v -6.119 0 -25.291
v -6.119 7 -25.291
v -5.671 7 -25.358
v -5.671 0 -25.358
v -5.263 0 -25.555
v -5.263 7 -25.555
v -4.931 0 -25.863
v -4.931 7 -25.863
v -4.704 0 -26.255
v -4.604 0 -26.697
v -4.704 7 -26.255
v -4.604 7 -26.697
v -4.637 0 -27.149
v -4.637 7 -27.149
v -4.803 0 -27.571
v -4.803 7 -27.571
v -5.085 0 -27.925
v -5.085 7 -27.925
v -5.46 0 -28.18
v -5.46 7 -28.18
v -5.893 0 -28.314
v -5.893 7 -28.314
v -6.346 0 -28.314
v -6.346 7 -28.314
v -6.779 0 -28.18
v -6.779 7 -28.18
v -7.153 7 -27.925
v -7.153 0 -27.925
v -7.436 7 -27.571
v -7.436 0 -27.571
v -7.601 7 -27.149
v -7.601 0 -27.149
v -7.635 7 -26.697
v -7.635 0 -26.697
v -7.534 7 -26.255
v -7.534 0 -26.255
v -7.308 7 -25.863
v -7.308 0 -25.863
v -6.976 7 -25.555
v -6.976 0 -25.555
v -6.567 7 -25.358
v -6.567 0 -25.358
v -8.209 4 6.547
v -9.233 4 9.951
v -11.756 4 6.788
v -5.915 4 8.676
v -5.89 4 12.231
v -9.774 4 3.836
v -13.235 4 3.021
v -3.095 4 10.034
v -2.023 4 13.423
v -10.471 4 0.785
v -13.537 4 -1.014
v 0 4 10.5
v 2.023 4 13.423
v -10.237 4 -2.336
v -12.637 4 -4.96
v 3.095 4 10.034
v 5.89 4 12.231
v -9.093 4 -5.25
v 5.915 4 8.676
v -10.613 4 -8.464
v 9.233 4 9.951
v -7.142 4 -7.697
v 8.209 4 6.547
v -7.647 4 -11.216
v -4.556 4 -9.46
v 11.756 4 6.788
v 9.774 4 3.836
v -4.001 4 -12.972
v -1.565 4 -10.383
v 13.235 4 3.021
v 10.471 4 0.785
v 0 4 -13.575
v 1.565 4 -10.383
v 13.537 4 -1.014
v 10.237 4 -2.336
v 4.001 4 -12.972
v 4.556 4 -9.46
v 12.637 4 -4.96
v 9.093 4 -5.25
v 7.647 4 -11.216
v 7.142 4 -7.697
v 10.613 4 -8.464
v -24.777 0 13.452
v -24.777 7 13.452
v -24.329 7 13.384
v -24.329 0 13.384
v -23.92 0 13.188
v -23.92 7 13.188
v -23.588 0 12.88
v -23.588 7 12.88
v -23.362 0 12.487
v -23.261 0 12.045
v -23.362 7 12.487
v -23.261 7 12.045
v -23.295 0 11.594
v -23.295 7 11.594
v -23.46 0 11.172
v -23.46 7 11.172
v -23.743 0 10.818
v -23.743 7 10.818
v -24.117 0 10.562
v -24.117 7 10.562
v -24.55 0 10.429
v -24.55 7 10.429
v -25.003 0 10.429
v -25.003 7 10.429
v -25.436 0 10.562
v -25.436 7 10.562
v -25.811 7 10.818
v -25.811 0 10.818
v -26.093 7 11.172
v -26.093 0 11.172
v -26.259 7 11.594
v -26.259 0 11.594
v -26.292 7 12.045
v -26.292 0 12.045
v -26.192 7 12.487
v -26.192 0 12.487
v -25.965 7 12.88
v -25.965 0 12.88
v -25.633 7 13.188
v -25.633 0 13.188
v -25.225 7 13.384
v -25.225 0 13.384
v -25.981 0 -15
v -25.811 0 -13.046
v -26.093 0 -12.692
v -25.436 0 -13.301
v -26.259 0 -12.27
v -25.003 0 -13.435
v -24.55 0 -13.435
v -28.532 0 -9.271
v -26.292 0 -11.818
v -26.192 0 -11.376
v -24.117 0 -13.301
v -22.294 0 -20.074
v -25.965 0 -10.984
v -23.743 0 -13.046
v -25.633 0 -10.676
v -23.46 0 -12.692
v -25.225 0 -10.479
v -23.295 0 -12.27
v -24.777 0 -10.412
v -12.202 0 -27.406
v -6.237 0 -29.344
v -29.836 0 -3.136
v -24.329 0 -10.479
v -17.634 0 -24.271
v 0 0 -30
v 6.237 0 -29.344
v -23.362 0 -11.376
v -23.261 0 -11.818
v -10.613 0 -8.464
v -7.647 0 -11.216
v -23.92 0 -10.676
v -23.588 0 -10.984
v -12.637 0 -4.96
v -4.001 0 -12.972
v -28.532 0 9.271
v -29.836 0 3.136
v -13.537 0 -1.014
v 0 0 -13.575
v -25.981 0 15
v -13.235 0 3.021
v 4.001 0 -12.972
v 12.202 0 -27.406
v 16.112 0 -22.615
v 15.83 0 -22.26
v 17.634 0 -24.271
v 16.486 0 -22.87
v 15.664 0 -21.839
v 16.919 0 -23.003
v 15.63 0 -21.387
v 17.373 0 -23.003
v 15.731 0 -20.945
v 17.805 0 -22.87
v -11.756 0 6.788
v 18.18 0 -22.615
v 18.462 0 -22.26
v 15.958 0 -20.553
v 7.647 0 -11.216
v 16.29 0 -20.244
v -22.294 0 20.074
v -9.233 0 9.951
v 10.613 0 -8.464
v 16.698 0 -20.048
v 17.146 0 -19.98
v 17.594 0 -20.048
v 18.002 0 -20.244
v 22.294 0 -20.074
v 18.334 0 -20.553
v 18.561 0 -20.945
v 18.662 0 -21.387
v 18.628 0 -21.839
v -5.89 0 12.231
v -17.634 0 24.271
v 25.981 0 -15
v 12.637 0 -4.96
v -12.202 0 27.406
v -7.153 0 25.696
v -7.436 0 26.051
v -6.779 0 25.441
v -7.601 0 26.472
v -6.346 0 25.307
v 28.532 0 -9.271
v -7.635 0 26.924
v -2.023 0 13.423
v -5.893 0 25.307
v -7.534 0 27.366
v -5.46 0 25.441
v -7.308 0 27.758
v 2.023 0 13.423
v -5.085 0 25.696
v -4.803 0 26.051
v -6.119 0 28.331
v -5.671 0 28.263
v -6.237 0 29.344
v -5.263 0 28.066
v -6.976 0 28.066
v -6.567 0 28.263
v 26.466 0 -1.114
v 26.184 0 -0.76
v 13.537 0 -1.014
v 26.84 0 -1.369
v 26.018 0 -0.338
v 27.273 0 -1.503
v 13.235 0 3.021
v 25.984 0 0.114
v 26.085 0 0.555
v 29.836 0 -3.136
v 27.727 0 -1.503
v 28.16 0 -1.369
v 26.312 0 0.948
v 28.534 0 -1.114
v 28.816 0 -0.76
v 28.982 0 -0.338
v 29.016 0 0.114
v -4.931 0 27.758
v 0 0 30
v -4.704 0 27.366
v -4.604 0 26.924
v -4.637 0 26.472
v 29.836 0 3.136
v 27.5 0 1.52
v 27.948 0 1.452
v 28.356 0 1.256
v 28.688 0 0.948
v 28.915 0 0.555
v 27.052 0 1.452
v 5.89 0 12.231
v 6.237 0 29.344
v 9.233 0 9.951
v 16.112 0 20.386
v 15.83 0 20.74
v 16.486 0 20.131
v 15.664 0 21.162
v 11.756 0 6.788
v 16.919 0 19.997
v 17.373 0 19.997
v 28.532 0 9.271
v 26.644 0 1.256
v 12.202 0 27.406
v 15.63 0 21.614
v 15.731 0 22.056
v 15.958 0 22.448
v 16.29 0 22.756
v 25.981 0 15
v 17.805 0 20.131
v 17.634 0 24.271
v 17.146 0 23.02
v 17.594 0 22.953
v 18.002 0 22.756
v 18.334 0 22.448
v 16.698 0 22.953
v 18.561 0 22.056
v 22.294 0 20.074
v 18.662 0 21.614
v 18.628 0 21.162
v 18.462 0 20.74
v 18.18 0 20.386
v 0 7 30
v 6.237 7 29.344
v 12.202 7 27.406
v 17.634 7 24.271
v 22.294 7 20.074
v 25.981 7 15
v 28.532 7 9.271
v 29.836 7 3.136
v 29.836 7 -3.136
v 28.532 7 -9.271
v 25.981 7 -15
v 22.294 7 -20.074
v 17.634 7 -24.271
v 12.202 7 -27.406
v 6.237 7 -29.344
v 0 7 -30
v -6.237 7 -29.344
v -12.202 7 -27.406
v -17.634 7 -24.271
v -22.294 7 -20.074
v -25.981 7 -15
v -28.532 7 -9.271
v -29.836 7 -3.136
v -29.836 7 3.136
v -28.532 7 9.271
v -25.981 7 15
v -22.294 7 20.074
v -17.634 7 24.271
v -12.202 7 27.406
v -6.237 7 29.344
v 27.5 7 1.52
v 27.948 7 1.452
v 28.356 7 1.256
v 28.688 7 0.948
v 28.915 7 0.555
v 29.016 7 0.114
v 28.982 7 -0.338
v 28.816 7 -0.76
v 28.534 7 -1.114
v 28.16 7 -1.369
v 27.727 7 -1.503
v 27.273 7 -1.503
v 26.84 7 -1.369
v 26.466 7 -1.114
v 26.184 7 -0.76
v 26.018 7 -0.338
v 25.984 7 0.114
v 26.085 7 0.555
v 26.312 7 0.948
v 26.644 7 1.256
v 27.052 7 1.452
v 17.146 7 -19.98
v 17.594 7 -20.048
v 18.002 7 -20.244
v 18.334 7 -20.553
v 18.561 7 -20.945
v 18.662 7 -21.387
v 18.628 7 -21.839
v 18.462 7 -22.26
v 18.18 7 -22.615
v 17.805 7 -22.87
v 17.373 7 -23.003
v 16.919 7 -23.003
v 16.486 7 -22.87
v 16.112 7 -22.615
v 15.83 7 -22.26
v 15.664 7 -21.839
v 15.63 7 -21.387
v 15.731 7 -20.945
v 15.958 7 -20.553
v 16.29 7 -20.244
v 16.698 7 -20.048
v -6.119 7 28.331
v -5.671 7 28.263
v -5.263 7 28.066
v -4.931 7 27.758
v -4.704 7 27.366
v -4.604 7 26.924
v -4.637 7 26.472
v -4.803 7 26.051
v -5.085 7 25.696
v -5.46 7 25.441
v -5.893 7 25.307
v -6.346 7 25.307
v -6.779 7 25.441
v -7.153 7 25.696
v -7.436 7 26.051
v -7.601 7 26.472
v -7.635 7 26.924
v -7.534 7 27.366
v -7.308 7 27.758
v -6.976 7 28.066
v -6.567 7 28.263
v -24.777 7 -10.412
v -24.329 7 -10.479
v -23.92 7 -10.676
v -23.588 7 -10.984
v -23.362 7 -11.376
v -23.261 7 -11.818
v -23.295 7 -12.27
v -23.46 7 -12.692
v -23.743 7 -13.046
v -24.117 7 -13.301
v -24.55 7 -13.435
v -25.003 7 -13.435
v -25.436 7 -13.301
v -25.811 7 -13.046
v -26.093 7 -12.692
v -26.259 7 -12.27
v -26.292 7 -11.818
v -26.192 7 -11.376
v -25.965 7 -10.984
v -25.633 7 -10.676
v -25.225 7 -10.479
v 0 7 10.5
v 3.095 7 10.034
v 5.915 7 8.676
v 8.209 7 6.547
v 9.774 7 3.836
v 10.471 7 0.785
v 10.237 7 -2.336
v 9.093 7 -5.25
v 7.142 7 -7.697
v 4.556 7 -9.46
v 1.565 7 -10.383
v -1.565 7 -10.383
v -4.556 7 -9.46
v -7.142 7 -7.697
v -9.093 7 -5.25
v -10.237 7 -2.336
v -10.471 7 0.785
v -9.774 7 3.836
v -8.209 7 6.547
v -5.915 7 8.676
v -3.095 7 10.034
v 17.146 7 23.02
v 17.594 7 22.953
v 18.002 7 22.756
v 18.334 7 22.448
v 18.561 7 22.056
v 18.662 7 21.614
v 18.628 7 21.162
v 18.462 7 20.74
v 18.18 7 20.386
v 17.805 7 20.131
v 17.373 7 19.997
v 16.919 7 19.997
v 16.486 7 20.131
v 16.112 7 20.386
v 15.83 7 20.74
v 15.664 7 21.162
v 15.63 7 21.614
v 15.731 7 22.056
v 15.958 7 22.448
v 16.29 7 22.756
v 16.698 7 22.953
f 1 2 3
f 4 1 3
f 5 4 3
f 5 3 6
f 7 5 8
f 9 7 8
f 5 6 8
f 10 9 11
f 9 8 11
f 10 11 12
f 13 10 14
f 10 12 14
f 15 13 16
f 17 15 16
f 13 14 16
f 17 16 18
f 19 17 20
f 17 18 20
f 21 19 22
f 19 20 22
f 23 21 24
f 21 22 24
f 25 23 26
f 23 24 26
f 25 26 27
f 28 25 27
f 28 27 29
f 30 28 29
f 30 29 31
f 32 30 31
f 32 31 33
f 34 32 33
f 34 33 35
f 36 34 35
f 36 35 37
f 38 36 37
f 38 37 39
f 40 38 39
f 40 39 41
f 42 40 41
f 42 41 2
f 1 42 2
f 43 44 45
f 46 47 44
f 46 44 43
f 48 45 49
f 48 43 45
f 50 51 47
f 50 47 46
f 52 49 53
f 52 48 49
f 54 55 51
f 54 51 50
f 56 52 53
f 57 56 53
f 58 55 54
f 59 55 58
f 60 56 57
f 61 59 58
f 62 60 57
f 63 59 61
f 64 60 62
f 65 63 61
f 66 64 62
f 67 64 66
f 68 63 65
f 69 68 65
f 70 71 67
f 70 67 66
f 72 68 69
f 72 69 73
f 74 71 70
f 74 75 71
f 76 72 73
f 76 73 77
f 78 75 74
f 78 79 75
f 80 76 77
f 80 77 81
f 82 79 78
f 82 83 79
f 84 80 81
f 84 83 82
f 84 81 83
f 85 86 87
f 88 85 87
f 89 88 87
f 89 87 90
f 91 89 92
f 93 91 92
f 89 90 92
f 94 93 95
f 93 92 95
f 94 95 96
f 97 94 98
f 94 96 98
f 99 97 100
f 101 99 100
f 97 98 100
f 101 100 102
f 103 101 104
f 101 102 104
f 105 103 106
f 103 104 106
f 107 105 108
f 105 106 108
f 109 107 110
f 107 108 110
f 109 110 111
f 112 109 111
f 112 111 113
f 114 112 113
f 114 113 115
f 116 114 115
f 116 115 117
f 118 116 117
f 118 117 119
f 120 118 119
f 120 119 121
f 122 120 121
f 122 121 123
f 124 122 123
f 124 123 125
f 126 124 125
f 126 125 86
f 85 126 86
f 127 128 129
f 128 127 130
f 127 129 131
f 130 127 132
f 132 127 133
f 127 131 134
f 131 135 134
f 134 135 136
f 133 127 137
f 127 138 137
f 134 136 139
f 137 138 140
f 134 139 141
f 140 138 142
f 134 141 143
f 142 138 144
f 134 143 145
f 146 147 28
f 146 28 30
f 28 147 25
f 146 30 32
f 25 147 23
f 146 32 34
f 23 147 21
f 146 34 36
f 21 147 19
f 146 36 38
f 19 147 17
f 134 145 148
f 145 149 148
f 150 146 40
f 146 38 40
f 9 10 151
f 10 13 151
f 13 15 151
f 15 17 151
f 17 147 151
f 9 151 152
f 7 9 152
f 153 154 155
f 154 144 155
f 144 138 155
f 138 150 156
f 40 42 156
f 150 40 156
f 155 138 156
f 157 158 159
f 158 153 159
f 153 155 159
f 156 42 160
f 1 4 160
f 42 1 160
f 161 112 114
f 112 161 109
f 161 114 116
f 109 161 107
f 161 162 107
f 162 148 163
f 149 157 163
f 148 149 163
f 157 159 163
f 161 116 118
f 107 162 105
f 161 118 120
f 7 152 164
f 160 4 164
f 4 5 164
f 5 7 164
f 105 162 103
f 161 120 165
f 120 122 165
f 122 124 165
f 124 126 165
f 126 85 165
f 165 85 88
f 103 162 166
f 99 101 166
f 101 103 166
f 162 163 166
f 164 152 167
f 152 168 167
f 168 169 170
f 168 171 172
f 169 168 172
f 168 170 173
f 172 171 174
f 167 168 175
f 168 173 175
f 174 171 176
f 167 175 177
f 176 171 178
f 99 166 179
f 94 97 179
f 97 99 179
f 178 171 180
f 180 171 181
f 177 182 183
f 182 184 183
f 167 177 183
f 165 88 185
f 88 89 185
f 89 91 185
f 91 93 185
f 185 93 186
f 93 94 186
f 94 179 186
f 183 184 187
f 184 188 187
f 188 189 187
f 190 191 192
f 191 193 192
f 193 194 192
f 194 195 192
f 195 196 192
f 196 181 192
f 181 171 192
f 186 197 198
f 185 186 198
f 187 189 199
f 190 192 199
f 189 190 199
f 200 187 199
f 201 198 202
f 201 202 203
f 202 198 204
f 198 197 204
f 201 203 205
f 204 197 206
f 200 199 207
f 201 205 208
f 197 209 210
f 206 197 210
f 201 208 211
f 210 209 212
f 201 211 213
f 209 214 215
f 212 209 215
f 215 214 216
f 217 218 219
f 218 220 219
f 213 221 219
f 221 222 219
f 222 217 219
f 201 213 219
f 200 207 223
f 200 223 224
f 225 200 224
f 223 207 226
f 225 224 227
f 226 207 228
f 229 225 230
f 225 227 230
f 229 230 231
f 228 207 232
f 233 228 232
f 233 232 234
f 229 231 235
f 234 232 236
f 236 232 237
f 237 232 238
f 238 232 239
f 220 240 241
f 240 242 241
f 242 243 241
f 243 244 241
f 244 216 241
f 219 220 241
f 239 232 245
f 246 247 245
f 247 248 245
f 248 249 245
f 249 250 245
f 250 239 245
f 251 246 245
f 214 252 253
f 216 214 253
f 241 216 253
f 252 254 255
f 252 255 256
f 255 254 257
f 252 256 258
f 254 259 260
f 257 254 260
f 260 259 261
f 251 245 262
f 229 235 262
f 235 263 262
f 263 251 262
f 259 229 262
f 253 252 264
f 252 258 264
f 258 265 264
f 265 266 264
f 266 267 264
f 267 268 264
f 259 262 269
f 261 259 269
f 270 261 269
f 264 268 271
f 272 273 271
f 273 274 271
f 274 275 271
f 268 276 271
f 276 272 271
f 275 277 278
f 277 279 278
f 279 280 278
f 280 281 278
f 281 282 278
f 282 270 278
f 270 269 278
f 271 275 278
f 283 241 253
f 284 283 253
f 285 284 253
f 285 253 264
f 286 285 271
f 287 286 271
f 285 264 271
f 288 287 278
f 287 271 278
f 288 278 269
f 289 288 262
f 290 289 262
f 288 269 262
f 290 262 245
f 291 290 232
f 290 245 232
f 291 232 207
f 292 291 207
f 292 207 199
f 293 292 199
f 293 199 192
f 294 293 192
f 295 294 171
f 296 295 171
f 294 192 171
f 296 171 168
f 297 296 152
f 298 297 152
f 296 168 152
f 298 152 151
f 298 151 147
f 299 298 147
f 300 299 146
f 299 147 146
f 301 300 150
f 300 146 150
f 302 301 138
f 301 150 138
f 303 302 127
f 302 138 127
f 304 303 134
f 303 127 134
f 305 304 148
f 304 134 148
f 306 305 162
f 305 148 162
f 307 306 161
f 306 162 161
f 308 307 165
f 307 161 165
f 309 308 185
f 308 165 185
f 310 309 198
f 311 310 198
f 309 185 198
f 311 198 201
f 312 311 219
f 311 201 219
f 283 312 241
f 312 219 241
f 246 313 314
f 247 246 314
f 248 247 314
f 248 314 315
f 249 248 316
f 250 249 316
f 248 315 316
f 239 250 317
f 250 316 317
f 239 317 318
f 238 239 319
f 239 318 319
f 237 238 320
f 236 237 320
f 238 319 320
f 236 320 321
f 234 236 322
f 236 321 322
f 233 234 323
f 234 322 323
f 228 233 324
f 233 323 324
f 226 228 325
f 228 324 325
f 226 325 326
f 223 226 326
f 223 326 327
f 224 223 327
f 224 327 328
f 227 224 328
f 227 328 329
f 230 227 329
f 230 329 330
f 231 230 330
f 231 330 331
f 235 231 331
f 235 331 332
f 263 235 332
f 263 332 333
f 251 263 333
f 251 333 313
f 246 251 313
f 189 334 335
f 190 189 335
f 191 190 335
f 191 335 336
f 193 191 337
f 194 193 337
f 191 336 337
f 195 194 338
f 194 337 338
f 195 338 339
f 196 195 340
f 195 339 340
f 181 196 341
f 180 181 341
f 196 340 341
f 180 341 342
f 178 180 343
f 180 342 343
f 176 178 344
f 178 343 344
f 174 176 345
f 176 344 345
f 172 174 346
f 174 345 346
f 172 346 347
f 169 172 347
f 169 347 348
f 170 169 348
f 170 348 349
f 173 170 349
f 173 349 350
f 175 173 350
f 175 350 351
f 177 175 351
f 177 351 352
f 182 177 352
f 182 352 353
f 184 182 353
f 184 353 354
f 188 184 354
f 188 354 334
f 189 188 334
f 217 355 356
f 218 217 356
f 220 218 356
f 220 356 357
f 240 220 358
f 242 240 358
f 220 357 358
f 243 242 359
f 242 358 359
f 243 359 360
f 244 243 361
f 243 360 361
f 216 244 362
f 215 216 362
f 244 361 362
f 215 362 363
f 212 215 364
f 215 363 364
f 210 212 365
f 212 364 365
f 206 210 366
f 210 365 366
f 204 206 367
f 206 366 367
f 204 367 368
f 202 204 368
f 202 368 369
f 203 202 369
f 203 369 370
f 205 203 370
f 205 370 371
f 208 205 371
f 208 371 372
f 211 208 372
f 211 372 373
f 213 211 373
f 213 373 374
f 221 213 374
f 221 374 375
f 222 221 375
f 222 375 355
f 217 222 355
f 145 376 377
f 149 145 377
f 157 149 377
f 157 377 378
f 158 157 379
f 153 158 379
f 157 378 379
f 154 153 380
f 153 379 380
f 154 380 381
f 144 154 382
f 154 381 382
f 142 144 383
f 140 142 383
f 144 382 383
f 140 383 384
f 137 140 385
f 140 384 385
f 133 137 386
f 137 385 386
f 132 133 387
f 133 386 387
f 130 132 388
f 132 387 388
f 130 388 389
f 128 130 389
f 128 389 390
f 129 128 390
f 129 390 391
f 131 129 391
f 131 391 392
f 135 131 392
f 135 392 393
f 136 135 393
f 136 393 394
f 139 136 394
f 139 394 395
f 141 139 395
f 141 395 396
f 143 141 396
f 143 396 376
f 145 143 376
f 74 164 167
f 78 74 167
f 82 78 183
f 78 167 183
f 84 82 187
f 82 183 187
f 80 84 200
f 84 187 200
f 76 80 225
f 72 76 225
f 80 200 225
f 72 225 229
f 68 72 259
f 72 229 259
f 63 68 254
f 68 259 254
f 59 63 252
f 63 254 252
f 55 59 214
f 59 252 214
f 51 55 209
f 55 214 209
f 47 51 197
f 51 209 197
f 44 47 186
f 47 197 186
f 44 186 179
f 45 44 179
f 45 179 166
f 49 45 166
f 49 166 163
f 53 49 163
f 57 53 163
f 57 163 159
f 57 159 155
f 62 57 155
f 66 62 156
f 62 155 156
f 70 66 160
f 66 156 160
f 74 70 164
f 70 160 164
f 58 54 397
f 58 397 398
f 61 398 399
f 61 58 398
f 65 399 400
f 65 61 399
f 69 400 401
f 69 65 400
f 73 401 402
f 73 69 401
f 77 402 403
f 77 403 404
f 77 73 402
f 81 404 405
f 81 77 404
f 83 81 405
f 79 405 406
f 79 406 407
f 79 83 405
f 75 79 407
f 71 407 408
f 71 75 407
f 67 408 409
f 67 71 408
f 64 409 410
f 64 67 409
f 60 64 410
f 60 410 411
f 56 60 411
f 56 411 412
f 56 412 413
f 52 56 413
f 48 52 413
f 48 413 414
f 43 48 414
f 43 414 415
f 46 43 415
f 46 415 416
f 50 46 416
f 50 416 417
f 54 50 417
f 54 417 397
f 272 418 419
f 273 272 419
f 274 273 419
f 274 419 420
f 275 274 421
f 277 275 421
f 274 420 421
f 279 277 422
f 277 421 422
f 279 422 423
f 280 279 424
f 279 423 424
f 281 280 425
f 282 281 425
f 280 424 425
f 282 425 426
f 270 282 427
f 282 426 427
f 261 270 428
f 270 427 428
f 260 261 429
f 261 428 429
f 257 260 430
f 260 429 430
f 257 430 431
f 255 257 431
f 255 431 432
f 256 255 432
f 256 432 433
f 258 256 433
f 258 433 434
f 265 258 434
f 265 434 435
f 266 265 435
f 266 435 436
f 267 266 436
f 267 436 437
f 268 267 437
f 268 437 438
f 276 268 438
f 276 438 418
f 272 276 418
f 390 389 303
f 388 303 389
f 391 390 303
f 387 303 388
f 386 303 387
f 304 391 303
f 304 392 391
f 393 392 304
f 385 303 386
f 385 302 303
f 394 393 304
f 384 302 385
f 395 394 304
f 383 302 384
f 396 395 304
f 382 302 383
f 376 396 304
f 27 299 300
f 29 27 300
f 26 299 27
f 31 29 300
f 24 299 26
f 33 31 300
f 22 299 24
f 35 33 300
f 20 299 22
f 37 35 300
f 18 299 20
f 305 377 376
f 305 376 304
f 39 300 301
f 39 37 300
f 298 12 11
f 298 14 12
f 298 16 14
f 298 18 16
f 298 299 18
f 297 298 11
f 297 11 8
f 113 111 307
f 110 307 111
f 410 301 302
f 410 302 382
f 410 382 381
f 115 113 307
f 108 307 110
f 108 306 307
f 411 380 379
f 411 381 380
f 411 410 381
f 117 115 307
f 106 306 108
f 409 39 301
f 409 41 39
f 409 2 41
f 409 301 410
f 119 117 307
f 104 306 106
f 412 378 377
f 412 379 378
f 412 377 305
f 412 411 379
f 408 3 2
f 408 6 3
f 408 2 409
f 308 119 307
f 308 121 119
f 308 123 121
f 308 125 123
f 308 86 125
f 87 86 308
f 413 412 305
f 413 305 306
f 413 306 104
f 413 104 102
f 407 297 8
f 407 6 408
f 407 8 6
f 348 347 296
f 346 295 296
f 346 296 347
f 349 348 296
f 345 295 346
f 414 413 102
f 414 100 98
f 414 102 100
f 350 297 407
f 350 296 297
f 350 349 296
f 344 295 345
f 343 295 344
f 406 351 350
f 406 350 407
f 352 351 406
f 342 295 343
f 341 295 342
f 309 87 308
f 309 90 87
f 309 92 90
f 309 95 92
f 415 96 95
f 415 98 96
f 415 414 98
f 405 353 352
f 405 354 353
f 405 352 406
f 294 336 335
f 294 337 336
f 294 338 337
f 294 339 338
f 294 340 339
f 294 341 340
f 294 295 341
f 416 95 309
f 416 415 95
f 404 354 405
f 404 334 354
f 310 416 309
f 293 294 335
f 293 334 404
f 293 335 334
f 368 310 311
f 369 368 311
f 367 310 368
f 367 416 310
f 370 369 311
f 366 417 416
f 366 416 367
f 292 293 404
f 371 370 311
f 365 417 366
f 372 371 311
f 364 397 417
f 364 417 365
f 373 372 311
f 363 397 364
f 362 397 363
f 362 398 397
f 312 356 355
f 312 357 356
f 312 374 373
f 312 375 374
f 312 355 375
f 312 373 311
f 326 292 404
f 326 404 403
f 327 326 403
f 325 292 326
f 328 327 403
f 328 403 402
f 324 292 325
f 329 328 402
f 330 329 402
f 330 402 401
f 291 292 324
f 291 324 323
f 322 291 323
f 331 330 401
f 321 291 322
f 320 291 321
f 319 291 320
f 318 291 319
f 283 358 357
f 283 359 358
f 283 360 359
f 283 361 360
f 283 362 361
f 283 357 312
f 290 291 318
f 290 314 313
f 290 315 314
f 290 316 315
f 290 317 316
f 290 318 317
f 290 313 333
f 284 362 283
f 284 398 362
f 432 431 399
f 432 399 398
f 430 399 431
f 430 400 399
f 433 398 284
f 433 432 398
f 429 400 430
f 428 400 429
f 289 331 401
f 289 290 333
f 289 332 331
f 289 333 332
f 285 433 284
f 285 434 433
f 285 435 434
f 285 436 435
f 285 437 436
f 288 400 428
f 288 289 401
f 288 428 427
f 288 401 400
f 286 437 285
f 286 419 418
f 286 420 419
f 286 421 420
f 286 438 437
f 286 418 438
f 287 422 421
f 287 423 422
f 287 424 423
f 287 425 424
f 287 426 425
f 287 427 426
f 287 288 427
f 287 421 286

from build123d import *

# Parameters (mm, degrees)
CROQUIS1_R              = 30
CROQUIS1_R_2            = 10.5
SALIENTE_EXTRUIR1_DEPTH = 7
CROQUIS2_R              = 13.575
CORTAR_EXTRUIR1_DEPTH   = 4
CROQUIS3_R              = 1.52
CORTAR_EXTRUIR2_DEPTH   = 44


with BuildPart() as part:
    # Croquis1 → Saliente-Extruir1 (new body)
    with BuildSketch(Plane(origin=(0, 0, 0), x_dir=(1, 0, 0), z_dir=(0, 1, 0))):
        with Locations(Location((0, 0, 0), (0, 0, 270))):
            Circle(CROQUIS1_R)
        with Locations(Location((0, 0, 0), (0, 0, 270))):
            Circle(CROQUIS1_R_2, mode=Mode.SUBTRACT)
    extrude(amount=SALIENTE_EXTRUIR1_DEPTH)

    # Croquis2 → Cortar-Extruir1 (cut)
    with BuildSketch(Plane.XZ):
        with Locations(Location((0, 0, 0), (0, 0, 270))):
            Circle(CROQUIS2_R)
    extrude(amount=-CORTAR_EXTRUIR1_DEPTH, mode=Mode.SUBTRACT)

    # Croquis3 → Cortar-Extruir2 (cut, through all)
    with BuildSketch(Plane(origin=(0, 7, 0), x_dir=(1, 0, 0), z_dir=(0, 1, 0))):
        with Locations(Location((27.5, 0, 0), (0, 0, 270))):
            Circle(CROQUIS3_R)
        with Locations(Location((17.145969551, -21.500365768, 0), (0, 0, 270))):
            Circle(CROQUIS3_R)
        with Locations(Location((-6.119325684, -26.810517585, 0), (0, 0, 270))):
            Circle(CROQUIS3_R)
        with Locations(Location((-24.776643867, -11.931802826, 0), (0, 0, 270))):
            Circle(CROQUIS3_R)
        with Locations(Location((-24.776643867, 11.931802826, 0), (0, 0, 270))):
            Circle(CROQUIS3_R)
        with Locations(Location((-6.119325684, 26.810517585, 0), (0, 0, 270))):
            Circle(CROQUIS3_R)
        with Locations(Location((17.145969551, 21.500365768, 0), (0, 0, 270))):
            Circle(CROQUIS3_R)
    extrude(amount=-CORTAR_EXTRUIR2_DEPTH, mode=Mode.SUBTRACT)


solid = part.part
